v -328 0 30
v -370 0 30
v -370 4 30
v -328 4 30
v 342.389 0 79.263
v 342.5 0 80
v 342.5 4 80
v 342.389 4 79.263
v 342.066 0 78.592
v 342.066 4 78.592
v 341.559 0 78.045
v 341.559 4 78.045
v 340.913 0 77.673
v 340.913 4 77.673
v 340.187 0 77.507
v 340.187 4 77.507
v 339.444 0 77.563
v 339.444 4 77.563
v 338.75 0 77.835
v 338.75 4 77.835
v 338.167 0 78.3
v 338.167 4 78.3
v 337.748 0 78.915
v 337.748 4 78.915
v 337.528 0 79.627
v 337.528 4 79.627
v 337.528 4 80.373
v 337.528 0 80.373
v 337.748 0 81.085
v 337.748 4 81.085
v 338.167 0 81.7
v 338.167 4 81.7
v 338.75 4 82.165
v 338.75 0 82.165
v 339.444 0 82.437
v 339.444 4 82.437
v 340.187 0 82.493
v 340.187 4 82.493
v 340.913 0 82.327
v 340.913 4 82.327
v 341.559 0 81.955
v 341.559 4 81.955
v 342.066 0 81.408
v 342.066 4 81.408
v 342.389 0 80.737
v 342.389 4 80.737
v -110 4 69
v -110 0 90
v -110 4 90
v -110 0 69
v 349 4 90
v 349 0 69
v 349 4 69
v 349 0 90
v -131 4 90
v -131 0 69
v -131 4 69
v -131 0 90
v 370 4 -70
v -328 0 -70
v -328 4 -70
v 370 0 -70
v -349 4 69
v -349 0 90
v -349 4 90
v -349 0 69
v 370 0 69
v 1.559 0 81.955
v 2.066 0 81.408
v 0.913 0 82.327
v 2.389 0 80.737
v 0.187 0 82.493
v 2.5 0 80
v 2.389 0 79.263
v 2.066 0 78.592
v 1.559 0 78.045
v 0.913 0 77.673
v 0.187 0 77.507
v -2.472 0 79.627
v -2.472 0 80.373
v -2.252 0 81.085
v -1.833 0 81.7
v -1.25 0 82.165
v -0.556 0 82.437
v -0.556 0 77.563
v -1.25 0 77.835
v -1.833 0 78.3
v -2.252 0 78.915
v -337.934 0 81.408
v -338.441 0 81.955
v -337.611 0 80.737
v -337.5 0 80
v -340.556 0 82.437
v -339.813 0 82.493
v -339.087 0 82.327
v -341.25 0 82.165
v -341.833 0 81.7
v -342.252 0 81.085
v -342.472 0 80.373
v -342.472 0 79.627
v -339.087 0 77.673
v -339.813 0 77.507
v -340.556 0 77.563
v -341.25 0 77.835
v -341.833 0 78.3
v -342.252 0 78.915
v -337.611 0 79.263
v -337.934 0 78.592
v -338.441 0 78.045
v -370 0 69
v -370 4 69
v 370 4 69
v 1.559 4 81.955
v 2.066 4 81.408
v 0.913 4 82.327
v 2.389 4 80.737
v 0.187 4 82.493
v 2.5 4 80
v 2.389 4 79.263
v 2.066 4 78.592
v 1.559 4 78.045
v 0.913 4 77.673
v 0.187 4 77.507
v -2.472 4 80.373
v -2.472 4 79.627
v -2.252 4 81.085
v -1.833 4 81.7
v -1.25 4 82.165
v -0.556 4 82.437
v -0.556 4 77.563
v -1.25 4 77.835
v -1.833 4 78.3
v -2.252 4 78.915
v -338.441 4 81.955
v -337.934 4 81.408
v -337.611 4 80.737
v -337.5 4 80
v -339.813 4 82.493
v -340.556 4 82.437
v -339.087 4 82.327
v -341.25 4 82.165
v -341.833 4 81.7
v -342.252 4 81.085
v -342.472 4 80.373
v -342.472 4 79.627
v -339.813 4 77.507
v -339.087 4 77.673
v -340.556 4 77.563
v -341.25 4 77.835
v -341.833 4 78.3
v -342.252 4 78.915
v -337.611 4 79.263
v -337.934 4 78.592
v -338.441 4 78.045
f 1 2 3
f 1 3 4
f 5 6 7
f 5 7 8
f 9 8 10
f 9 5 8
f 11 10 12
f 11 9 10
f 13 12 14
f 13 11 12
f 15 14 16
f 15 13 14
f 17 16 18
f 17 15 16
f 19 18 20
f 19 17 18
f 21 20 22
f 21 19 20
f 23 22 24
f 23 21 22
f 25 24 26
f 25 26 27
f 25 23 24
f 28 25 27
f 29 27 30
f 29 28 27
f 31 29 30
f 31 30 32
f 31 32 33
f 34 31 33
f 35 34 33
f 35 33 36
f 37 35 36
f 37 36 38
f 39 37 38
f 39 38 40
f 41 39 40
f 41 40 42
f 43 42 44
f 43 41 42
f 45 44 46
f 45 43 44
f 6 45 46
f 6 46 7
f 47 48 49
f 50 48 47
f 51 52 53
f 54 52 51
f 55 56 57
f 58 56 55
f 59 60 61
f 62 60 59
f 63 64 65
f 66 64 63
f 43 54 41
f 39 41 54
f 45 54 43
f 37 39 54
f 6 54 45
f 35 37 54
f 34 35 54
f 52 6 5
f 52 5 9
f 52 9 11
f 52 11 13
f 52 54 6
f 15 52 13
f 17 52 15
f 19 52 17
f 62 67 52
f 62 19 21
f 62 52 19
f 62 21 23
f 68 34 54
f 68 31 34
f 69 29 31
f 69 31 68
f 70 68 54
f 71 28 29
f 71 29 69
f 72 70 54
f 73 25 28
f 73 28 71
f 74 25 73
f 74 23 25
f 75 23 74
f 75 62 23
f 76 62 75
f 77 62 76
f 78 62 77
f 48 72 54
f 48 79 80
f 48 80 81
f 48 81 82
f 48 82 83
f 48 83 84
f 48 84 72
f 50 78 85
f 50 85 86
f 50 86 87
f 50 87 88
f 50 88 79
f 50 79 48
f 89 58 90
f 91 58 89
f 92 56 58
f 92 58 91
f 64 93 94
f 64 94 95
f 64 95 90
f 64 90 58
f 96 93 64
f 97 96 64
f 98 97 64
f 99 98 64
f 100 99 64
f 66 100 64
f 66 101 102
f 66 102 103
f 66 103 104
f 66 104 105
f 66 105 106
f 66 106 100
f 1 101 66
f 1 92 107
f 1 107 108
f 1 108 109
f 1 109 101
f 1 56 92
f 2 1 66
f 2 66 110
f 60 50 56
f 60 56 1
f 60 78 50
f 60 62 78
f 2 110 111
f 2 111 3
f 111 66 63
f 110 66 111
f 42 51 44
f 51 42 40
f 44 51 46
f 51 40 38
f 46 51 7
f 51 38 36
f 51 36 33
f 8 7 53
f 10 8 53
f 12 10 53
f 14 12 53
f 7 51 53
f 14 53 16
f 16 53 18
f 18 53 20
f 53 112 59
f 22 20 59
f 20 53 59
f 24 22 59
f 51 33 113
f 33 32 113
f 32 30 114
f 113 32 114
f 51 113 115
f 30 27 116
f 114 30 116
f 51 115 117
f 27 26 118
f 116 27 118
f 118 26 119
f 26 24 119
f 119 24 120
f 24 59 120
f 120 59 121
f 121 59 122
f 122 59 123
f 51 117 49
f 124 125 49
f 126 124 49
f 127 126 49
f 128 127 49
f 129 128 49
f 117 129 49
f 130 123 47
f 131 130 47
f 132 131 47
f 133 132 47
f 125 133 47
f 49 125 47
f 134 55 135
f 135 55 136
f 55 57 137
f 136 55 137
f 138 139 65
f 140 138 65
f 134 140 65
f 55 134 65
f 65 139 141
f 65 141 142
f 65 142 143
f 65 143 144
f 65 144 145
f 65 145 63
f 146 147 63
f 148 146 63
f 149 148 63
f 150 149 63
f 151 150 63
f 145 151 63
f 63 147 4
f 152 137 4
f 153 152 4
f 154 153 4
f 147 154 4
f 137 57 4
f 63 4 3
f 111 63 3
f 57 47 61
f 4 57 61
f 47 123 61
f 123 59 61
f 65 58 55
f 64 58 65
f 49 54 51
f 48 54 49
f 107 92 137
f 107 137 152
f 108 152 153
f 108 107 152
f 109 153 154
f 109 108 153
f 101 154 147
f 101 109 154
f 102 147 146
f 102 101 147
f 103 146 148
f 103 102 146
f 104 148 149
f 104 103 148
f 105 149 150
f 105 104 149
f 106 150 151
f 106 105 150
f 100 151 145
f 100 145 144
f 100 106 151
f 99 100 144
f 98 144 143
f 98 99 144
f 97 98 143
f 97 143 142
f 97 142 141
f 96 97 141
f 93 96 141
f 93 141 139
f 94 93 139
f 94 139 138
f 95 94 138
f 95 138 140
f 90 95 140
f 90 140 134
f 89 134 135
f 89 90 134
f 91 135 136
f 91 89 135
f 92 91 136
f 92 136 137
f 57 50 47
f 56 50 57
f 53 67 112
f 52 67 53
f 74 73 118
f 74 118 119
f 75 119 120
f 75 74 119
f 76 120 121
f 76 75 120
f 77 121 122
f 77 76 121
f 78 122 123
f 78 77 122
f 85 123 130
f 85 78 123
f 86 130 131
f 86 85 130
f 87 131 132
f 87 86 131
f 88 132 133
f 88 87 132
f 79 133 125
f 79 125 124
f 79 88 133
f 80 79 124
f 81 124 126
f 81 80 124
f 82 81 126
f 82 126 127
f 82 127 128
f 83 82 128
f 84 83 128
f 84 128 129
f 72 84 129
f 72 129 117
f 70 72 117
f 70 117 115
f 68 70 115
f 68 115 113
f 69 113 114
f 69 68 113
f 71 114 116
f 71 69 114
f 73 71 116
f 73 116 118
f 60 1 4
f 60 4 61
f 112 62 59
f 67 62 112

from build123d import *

# Parameters (mm, degrees)
SKETCH1_R           = 2.5
BOSS_EXTRUDE1_DEPTH = 4


with BuildPart() as part:
    # Sketch1 → Boss-Extrude1 (new body)
    with BuildSketch(Plane(origin=(0, 0, 0), x_dir=(1, 0, 0), z_dir=(0, 1, 0))):
        Polygon((-370, -69), (-370, -30), (-328, -30), (-328, 70), (370, 70), (370, -69), (349, -69), (349, -90), (-110, -90), (-110, -69), (-131, -69), (-131, -90), (-349, -90), (-349, -69), align=None)
        with Locations((-340, -80)):
            Circle(SKETCH1_R, mode=Mode.SUBTRACT)
        with Locations((0, -80)):
            Circle(SKETCH1_R, mode=Mode.SUBTRACT)
        with Locations((340, -80)):
            Circle(SKETCH1_R, mode=Mode.SUBTRACT)
    extrude(amount=BOSS_EXTRUDE1_DEPTH)


solid = part.part
